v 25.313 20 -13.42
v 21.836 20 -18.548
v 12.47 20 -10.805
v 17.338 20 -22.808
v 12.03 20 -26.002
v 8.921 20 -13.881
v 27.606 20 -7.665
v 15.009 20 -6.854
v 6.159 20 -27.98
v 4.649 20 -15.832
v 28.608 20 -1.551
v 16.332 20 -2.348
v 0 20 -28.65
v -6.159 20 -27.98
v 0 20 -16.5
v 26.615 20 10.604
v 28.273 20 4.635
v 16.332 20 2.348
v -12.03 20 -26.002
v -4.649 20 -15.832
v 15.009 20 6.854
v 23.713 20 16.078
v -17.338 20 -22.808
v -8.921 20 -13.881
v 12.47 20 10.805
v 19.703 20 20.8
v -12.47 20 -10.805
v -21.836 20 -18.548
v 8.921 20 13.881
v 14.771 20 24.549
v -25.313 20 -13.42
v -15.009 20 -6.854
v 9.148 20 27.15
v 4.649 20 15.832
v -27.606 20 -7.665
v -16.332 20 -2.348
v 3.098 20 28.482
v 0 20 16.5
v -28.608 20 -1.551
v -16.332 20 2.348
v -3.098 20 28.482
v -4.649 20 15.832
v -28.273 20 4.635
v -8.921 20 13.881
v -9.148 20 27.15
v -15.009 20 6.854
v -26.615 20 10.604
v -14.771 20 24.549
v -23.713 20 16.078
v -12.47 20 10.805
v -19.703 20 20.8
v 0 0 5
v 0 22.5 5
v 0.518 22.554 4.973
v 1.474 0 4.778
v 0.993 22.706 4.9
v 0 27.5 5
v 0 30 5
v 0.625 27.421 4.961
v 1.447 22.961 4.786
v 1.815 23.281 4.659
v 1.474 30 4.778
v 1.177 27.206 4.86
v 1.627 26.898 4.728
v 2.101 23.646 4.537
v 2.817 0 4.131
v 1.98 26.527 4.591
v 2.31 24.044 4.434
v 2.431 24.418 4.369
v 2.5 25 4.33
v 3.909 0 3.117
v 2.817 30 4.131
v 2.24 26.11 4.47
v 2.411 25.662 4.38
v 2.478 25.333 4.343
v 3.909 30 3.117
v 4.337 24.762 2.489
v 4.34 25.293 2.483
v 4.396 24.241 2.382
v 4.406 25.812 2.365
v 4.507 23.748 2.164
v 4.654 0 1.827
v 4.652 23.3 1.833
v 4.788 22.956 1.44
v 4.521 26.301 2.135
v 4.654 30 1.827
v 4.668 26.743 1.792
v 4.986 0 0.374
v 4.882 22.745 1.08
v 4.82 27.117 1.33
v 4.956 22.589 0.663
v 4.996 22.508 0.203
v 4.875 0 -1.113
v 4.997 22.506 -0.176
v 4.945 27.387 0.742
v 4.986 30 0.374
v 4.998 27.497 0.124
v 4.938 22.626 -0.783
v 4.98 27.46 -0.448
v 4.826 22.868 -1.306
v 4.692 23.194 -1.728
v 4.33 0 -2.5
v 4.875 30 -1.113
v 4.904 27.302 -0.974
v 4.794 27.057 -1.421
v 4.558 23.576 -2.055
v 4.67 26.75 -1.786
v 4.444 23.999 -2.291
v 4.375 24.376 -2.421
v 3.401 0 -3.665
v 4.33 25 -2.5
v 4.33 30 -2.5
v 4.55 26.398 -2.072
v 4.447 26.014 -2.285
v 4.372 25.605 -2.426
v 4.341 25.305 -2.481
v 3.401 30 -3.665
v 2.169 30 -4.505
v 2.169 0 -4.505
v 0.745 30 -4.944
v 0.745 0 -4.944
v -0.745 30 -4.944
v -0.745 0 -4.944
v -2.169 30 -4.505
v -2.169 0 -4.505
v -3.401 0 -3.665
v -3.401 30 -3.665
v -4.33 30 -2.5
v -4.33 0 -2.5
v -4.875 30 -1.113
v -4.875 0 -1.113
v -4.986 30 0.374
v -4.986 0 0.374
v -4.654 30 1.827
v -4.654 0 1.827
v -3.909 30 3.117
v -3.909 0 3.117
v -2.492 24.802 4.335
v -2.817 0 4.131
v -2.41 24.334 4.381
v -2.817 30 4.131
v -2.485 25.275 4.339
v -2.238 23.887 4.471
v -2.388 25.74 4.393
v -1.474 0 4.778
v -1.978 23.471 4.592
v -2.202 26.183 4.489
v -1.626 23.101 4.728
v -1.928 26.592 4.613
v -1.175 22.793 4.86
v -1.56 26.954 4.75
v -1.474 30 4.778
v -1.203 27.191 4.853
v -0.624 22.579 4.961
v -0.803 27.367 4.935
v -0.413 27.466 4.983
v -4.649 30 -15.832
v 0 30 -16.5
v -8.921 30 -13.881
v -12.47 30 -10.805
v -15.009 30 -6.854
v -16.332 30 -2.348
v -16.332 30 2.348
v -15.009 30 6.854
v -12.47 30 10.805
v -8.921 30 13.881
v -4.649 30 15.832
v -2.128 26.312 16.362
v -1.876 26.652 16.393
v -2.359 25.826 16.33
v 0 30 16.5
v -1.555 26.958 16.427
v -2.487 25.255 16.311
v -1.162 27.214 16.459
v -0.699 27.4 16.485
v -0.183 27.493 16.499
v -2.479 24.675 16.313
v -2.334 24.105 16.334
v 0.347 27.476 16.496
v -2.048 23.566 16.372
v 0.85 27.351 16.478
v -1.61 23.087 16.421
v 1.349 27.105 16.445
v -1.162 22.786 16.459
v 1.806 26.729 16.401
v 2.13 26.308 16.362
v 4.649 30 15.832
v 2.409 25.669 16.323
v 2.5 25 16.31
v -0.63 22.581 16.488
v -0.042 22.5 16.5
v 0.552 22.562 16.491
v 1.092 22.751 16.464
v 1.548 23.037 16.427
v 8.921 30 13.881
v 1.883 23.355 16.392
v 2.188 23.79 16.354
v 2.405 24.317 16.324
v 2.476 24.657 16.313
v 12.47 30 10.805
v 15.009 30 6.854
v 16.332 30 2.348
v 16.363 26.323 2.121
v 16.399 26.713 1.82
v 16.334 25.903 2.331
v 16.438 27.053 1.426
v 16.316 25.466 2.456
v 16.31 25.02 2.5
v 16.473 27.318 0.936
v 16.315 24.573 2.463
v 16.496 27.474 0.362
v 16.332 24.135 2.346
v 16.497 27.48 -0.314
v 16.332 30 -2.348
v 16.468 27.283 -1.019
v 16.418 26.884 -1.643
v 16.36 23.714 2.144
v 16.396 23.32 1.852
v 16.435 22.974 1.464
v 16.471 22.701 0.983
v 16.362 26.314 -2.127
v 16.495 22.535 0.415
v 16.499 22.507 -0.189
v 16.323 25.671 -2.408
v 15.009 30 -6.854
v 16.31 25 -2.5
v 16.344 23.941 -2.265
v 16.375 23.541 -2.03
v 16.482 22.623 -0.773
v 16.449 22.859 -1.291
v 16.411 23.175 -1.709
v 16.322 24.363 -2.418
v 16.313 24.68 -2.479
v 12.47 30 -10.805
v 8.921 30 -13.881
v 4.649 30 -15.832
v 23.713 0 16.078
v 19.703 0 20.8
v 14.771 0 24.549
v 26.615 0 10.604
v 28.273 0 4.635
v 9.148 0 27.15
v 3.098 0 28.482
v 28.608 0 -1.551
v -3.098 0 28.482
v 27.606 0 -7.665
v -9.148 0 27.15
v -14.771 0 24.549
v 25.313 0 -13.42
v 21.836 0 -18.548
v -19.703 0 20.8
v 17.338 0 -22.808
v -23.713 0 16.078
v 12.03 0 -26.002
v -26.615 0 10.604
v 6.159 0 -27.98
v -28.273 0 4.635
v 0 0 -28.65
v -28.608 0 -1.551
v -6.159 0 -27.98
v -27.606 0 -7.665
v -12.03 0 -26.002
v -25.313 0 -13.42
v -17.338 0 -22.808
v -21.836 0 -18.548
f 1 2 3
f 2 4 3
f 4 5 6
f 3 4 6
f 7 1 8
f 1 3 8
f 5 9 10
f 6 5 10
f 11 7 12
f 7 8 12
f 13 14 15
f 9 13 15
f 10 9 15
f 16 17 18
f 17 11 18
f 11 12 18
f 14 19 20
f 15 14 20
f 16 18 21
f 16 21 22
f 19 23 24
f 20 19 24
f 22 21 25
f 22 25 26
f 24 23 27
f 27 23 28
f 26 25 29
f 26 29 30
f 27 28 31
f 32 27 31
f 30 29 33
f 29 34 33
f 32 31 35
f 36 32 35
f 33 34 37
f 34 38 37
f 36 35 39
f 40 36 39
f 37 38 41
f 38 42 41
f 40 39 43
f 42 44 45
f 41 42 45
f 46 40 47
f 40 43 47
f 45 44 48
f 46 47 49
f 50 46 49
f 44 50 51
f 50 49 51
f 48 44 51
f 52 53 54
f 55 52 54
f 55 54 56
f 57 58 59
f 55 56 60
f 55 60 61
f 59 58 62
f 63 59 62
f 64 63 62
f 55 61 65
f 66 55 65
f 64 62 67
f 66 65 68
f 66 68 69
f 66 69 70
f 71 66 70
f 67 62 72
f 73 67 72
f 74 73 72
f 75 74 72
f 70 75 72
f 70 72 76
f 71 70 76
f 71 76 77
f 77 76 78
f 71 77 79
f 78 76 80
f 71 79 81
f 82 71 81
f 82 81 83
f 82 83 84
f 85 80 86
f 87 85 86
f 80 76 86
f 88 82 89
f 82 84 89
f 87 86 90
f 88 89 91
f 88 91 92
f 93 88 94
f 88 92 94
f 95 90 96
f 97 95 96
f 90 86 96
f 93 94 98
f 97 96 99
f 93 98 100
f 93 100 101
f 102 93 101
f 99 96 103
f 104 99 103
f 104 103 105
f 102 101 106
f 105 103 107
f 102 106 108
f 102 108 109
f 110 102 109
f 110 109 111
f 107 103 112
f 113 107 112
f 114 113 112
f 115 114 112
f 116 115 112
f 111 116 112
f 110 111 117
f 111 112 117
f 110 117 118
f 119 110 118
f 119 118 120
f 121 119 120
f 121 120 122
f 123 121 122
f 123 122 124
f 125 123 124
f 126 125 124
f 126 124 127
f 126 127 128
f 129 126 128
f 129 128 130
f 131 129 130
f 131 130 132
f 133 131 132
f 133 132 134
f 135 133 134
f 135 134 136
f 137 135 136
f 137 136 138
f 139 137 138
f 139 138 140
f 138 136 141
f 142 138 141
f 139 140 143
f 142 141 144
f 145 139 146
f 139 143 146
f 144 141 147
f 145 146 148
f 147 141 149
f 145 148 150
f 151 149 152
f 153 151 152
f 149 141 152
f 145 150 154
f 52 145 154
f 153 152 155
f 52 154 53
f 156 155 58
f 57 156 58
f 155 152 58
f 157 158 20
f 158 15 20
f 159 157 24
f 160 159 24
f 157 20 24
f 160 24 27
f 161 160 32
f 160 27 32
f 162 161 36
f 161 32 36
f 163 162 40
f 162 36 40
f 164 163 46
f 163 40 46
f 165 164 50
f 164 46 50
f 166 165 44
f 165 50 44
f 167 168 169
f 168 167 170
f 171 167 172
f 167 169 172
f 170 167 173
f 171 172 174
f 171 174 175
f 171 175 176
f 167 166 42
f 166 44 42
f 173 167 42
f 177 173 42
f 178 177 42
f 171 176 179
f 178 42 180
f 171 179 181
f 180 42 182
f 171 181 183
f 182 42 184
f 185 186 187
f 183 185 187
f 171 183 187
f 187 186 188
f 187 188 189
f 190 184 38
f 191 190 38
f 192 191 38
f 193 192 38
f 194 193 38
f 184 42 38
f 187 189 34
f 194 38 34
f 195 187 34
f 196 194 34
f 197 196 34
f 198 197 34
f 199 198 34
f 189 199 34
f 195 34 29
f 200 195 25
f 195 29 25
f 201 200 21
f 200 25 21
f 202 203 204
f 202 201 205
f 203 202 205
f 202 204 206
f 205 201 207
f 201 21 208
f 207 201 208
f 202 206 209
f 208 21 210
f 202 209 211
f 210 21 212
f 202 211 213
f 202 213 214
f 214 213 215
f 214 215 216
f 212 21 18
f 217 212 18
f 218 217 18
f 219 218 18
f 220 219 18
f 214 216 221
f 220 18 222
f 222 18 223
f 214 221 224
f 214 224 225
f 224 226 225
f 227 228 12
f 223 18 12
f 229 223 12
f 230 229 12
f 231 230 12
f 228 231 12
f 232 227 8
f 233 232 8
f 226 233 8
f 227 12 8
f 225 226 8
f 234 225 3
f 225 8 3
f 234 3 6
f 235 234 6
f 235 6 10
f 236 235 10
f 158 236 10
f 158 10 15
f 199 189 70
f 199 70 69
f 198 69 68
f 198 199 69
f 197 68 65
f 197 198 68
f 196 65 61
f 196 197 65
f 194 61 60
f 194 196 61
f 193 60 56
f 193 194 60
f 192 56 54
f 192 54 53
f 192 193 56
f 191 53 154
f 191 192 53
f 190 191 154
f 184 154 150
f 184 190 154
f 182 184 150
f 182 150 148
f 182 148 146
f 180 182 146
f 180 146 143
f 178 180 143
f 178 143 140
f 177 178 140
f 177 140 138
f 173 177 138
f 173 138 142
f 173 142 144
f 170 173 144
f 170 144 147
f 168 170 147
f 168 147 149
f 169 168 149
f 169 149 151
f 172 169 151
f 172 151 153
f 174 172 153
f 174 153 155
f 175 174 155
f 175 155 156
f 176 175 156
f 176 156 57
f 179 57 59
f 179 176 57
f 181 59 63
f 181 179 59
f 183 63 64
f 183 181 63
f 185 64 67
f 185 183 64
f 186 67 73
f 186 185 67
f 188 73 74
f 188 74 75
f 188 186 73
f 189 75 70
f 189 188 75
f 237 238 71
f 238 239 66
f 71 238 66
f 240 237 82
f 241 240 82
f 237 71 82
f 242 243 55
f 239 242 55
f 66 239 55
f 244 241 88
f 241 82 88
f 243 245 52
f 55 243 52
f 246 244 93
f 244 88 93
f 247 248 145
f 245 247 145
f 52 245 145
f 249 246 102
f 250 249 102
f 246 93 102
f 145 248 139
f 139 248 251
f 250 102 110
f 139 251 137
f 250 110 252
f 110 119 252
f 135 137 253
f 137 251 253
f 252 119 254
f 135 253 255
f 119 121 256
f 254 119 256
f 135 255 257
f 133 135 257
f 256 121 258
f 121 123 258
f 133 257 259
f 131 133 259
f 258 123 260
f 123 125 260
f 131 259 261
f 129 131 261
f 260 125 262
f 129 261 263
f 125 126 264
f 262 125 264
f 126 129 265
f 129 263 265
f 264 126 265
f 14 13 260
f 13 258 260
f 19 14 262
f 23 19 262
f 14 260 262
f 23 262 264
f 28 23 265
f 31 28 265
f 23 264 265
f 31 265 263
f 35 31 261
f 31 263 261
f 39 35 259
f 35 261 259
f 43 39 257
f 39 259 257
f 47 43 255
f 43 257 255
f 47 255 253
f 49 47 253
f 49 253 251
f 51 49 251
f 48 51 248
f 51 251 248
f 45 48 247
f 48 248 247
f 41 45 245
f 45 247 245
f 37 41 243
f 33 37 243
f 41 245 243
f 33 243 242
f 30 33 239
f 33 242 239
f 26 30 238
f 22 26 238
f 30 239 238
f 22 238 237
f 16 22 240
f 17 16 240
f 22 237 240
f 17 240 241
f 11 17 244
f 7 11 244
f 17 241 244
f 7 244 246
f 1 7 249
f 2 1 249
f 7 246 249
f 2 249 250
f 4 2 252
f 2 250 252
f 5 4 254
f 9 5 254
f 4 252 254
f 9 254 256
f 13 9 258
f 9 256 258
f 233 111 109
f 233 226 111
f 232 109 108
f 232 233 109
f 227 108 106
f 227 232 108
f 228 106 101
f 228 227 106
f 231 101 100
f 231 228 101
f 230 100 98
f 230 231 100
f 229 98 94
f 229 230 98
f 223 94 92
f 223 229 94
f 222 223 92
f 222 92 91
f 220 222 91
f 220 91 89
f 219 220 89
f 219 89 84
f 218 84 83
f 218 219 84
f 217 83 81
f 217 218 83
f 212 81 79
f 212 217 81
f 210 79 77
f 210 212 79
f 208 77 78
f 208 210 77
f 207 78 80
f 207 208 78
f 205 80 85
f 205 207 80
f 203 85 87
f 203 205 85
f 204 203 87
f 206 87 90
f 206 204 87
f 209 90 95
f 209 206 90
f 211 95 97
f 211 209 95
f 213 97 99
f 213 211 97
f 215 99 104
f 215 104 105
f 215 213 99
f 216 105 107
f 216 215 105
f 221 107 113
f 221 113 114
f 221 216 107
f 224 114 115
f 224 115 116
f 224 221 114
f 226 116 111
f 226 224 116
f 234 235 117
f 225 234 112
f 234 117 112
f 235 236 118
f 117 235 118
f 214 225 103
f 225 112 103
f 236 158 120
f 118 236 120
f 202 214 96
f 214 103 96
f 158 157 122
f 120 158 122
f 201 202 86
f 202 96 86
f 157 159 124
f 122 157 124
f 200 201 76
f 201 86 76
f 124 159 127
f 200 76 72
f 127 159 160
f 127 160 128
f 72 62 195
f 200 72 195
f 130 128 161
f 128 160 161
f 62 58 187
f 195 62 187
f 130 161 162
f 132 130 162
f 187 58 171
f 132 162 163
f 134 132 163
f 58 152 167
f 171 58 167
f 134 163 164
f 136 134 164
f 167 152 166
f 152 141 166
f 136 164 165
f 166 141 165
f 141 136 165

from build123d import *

# Parameters (mm, degrees)
CROQUIS3_R            = 5
CORTAR_EXTRUIR1_DEPTH = 51.41472999
MATRIZC1_COUNT        = 2
MATRIZC1_ANGLE        = 90


with BuildPart() as part:
    # Croquis1 → Revolución1 (revolve)
    with BuildSketch(Plane.XY, mode=Mode.PRIVATE) as revoluci_n1_sk:
        Polygon((-4, 0), (-4, 30), (-16.5, 30), (-16.5, 20), (-28.65, 20), (-28.65, 0), align=None)
    revolve(revoluci_n1_sk.sketch.rotate(Axis((0, 0, 0), (0, 1, 0)), 270), axis=Axis((0, 0, 0), (0, 1, 0)))

    # Croquis3 → Cortar-Extruir1 (cut, through all)
    with BuildSketch(Plane(origin=(0, 30, 0), x_dir=(1, 0, 0), z_dir=(0, 1, 0))):
        with Locations(Location((0, 0, 0), (0, 0, 270))):
            Circle(CROQUIS3_R)
    extrude(amount=-CORTAR_EXTRUIR1_DEPTH, mode=Mode.SUBTRACT)

    # Croquis6 → Taladro roscado M6x1.01 (revolve, cut)
    with BuildSketch(Plane(origin=(16.5, 25, 0), x_dir=(0, 0, -1), z_dir=(0, 1, 0))):
        Polygon((0, 0), (0, 18.502151548), (2.5, 17), (2.5, 0), align=None)
    taladro_roscado_m6x1_01 = revolve(axis=Axis((22.85, 25, 0), (-1, 0, 0)), mode=Mode.SUBTRACT)

    # MatrizC1: Taladro roscado M6x1.01 ×2 about axis
    matrizc1_axis = Axis((0, 30, 0), (0, -1, 0))
    for i in range(1, MATRIZC1_COUNT):
        add(taladro_roscado_m6x1_01.rotate(matrizc1_axis, i * MATRIZC1_ANGLE / (MATRIZC1_COUNT - 1)), mode=Mode.SUBTRACT)


solid = part.part
